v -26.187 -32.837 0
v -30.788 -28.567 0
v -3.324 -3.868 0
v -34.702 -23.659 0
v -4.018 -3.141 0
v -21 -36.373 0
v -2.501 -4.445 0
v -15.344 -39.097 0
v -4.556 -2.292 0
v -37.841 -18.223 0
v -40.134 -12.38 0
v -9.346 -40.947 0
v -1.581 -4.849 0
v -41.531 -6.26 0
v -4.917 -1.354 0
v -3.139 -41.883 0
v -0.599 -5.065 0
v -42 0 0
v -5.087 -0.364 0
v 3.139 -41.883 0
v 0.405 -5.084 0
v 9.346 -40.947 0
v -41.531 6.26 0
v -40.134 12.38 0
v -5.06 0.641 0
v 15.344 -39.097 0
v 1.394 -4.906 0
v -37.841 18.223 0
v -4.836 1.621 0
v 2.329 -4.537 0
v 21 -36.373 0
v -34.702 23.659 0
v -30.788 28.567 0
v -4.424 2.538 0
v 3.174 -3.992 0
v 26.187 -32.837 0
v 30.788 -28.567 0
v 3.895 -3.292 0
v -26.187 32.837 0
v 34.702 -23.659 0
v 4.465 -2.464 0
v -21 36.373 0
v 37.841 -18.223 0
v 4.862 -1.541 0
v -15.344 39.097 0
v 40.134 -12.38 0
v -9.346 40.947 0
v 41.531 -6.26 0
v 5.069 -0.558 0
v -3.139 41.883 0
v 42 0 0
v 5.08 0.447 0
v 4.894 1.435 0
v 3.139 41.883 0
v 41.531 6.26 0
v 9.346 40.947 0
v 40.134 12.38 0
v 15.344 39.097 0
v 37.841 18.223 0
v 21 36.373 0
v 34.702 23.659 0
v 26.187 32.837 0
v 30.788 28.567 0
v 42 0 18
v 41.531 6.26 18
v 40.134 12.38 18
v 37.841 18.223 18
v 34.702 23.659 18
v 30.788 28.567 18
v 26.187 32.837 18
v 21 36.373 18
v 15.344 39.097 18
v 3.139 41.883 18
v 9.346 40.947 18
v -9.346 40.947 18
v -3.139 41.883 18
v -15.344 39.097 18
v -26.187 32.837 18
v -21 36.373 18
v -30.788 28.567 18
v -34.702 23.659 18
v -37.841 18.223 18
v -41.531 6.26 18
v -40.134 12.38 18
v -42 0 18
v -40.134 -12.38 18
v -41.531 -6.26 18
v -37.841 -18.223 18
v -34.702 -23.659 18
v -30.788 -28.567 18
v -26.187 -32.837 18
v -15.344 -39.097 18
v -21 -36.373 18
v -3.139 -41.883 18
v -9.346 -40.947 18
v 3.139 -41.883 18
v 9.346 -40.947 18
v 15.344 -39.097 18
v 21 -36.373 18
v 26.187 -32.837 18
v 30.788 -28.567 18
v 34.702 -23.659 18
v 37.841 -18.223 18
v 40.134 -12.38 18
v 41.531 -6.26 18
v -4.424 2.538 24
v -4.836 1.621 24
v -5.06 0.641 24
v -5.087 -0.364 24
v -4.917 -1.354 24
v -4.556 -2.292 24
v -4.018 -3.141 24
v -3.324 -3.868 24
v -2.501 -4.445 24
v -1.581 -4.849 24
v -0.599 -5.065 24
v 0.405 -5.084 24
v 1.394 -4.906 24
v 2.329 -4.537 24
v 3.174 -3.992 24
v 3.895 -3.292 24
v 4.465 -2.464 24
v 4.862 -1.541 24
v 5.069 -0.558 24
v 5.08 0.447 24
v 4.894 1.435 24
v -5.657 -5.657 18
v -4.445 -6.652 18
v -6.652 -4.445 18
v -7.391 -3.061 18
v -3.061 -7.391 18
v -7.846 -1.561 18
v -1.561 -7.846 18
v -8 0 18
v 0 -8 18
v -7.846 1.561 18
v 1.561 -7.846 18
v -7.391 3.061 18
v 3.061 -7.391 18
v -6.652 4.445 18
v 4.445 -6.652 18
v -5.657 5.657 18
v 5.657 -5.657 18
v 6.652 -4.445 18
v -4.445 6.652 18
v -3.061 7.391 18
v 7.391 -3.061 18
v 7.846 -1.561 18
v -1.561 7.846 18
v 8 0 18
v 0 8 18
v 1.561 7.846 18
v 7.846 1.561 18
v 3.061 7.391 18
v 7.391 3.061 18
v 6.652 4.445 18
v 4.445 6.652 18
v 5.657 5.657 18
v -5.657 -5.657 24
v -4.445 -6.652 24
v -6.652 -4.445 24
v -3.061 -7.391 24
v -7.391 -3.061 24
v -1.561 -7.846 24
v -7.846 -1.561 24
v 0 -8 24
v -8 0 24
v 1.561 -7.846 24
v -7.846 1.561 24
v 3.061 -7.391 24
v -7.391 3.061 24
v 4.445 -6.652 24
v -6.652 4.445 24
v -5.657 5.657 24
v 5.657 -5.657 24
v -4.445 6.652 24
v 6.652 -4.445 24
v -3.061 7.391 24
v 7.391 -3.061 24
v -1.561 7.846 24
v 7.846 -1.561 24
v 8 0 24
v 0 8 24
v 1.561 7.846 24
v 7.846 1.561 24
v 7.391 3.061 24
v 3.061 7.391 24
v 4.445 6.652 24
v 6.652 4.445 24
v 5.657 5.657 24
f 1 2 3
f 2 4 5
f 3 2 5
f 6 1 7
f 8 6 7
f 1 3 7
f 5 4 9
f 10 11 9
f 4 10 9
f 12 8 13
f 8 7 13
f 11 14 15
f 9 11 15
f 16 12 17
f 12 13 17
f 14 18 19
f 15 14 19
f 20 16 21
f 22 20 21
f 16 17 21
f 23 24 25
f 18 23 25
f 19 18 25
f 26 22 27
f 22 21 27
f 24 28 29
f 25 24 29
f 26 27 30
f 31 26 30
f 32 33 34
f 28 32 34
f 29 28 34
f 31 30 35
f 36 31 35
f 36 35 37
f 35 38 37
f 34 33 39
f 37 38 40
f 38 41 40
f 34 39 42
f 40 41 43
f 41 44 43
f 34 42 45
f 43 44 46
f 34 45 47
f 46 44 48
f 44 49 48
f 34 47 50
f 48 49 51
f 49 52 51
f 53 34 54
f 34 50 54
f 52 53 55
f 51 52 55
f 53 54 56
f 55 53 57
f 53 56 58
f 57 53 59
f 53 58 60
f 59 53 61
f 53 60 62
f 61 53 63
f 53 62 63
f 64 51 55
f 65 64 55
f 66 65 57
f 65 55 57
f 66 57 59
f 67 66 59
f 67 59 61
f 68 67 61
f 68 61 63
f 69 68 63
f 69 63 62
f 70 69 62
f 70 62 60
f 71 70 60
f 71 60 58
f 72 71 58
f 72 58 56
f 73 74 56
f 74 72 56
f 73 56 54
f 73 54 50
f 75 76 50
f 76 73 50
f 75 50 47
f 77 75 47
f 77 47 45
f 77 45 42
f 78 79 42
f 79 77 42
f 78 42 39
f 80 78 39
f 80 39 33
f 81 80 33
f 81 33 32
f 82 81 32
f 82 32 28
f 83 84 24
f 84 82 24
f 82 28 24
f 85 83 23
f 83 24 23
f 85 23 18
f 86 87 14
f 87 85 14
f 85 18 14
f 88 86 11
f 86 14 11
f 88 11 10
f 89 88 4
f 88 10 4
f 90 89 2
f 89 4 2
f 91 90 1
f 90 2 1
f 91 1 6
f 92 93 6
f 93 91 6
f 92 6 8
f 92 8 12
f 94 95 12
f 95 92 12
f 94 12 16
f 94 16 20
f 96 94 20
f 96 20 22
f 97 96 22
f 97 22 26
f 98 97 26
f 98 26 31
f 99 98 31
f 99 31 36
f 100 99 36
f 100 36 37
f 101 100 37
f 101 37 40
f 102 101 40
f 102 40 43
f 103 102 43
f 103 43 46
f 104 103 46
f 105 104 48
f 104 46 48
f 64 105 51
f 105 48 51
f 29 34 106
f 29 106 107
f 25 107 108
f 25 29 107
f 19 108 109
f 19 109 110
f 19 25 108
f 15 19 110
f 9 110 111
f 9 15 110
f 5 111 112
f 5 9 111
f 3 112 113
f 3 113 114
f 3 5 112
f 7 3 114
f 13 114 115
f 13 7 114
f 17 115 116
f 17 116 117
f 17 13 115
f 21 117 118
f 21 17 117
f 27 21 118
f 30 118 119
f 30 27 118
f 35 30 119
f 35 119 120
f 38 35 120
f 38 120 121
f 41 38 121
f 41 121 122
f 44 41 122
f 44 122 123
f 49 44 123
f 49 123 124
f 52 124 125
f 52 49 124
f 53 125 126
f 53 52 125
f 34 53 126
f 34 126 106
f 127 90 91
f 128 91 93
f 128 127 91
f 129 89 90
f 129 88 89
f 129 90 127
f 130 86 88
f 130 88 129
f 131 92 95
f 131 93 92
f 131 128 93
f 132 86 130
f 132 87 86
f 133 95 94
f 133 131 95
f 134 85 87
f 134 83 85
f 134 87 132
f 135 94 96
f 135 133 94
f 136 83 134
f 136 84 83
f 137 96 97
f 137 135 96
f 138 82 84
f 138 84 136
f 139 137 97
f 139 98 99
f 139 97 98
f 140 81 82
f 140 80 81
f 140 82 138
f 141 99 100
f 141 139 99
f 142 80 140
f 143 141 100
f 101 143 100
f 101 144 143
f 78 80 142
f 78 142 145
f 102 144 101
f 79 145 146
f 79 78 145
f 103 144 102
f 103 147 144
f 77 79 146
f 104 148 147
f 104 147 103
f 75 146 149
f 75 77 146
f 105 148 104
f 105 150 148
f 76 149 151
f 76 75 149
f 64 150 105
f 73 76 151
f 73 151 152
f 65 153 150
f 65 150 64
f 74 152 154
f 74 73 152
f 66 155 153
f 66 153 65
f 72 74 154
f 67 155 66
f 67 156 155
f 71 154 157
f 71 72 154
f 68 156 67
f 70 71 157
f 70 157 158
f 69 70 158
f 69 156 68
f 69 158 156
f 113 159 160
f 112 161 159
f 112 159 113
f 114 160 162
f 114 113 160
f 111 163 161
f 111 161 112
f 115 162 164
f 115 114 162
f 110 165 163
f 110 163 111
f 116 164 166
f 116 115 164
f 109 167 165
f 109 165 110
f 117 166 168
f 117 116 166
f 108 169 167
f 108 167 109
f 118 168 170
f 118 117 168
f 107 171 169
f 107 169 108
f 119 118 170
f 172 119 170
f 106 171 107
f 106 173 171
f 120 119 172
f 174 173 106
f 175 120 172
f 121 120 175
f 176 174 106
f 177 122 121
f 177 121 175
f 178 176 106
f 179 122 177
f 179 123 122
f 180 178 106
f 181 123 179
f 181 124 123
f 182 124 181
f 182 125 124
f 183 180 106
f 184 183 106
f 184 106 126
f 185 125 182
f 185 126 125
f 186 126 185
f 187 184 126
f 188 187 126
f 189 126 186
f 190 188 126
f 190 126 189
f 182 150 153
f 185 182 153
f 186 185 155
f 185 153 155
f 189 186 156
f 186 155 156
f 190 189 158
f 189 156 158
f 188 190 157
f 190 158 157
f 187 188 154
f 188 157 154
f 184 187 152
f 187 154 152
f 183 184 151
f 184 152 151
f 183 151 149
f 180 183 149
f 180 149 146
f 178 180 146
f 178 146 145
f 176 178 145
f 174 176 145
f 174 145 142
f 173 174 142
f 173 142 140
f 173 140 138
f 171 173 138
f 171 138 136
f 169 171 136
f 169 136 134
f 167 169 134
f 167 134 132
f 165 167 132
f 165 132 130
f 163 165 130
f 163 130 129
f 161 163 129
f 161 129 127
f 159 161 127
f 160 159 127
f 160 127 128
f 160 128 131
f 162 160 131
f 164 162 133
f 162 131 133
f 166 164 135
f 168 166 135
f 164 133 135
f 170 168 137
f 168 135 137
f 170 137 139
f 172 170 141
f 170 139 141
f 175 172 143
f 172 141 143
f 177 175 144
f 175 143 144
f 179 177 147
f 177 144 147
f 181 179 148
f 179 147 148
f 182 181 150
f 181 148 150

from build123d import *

# Parameters (mm, degrees)
SKETCH_1_R      = 8
EXTRUDE_1_DEPTH = 24
SKETCH_2_R      = 42
SKETCH_2_R_2    = 8
EXTRUDE_2_DEPTH = 18
EXTRUDE_3_DEPTH = 18


with BuildPart() as part:
    # 草图1 → 凸台-拉伸1 (new body)
    with BuildSketch(Plane.XY):
        Circle(SKETCH_1_R)
        with BuildLine():
            Line((4.89403723, 1.434712371), (-4.42388764, 2.537561456))
            ThreePointArc((-4.42388764, 2.537561456), (-0.599440727, -5.06464913), (4.89403723, 1.434712371))
        make_face(mode=Mode.SUBTRACT)
    extrude(amount=EXTRUDE_1_DEPTH)

    # 草图2 → 凸台-拉伸2 (add)
    with BuildSketch(Plane.XY):
        Circle(SKETCH_2_R)
        Circle(SKETCH_2_R_2, mode=Mode.SUBTRACT)
    extrude(amount=EXTRUDE_2_DEPTH)

    # 草图3 → 凸台-拉伸3 (add)
    with BuildSketch(Plane.XY):
        with BuildLine():
            Line((37.532556284, 2.035291149), (41.987004924, 1.044709313))
            ThreePointArc((41.987004924, 1.044709313), (42, 0), (41.987004924, -1.044709313))
            Line((41.987004924, -1.044709313), (37.532556284, -2.035291149))
            ThreePointArc((37.532556284, -2.035291149), (37.5877, 0), (37.532556284, 2.035291149))
        make_face()
    extrude(amount=EXTRUDE_3_DEPTH)


solid = part.part
